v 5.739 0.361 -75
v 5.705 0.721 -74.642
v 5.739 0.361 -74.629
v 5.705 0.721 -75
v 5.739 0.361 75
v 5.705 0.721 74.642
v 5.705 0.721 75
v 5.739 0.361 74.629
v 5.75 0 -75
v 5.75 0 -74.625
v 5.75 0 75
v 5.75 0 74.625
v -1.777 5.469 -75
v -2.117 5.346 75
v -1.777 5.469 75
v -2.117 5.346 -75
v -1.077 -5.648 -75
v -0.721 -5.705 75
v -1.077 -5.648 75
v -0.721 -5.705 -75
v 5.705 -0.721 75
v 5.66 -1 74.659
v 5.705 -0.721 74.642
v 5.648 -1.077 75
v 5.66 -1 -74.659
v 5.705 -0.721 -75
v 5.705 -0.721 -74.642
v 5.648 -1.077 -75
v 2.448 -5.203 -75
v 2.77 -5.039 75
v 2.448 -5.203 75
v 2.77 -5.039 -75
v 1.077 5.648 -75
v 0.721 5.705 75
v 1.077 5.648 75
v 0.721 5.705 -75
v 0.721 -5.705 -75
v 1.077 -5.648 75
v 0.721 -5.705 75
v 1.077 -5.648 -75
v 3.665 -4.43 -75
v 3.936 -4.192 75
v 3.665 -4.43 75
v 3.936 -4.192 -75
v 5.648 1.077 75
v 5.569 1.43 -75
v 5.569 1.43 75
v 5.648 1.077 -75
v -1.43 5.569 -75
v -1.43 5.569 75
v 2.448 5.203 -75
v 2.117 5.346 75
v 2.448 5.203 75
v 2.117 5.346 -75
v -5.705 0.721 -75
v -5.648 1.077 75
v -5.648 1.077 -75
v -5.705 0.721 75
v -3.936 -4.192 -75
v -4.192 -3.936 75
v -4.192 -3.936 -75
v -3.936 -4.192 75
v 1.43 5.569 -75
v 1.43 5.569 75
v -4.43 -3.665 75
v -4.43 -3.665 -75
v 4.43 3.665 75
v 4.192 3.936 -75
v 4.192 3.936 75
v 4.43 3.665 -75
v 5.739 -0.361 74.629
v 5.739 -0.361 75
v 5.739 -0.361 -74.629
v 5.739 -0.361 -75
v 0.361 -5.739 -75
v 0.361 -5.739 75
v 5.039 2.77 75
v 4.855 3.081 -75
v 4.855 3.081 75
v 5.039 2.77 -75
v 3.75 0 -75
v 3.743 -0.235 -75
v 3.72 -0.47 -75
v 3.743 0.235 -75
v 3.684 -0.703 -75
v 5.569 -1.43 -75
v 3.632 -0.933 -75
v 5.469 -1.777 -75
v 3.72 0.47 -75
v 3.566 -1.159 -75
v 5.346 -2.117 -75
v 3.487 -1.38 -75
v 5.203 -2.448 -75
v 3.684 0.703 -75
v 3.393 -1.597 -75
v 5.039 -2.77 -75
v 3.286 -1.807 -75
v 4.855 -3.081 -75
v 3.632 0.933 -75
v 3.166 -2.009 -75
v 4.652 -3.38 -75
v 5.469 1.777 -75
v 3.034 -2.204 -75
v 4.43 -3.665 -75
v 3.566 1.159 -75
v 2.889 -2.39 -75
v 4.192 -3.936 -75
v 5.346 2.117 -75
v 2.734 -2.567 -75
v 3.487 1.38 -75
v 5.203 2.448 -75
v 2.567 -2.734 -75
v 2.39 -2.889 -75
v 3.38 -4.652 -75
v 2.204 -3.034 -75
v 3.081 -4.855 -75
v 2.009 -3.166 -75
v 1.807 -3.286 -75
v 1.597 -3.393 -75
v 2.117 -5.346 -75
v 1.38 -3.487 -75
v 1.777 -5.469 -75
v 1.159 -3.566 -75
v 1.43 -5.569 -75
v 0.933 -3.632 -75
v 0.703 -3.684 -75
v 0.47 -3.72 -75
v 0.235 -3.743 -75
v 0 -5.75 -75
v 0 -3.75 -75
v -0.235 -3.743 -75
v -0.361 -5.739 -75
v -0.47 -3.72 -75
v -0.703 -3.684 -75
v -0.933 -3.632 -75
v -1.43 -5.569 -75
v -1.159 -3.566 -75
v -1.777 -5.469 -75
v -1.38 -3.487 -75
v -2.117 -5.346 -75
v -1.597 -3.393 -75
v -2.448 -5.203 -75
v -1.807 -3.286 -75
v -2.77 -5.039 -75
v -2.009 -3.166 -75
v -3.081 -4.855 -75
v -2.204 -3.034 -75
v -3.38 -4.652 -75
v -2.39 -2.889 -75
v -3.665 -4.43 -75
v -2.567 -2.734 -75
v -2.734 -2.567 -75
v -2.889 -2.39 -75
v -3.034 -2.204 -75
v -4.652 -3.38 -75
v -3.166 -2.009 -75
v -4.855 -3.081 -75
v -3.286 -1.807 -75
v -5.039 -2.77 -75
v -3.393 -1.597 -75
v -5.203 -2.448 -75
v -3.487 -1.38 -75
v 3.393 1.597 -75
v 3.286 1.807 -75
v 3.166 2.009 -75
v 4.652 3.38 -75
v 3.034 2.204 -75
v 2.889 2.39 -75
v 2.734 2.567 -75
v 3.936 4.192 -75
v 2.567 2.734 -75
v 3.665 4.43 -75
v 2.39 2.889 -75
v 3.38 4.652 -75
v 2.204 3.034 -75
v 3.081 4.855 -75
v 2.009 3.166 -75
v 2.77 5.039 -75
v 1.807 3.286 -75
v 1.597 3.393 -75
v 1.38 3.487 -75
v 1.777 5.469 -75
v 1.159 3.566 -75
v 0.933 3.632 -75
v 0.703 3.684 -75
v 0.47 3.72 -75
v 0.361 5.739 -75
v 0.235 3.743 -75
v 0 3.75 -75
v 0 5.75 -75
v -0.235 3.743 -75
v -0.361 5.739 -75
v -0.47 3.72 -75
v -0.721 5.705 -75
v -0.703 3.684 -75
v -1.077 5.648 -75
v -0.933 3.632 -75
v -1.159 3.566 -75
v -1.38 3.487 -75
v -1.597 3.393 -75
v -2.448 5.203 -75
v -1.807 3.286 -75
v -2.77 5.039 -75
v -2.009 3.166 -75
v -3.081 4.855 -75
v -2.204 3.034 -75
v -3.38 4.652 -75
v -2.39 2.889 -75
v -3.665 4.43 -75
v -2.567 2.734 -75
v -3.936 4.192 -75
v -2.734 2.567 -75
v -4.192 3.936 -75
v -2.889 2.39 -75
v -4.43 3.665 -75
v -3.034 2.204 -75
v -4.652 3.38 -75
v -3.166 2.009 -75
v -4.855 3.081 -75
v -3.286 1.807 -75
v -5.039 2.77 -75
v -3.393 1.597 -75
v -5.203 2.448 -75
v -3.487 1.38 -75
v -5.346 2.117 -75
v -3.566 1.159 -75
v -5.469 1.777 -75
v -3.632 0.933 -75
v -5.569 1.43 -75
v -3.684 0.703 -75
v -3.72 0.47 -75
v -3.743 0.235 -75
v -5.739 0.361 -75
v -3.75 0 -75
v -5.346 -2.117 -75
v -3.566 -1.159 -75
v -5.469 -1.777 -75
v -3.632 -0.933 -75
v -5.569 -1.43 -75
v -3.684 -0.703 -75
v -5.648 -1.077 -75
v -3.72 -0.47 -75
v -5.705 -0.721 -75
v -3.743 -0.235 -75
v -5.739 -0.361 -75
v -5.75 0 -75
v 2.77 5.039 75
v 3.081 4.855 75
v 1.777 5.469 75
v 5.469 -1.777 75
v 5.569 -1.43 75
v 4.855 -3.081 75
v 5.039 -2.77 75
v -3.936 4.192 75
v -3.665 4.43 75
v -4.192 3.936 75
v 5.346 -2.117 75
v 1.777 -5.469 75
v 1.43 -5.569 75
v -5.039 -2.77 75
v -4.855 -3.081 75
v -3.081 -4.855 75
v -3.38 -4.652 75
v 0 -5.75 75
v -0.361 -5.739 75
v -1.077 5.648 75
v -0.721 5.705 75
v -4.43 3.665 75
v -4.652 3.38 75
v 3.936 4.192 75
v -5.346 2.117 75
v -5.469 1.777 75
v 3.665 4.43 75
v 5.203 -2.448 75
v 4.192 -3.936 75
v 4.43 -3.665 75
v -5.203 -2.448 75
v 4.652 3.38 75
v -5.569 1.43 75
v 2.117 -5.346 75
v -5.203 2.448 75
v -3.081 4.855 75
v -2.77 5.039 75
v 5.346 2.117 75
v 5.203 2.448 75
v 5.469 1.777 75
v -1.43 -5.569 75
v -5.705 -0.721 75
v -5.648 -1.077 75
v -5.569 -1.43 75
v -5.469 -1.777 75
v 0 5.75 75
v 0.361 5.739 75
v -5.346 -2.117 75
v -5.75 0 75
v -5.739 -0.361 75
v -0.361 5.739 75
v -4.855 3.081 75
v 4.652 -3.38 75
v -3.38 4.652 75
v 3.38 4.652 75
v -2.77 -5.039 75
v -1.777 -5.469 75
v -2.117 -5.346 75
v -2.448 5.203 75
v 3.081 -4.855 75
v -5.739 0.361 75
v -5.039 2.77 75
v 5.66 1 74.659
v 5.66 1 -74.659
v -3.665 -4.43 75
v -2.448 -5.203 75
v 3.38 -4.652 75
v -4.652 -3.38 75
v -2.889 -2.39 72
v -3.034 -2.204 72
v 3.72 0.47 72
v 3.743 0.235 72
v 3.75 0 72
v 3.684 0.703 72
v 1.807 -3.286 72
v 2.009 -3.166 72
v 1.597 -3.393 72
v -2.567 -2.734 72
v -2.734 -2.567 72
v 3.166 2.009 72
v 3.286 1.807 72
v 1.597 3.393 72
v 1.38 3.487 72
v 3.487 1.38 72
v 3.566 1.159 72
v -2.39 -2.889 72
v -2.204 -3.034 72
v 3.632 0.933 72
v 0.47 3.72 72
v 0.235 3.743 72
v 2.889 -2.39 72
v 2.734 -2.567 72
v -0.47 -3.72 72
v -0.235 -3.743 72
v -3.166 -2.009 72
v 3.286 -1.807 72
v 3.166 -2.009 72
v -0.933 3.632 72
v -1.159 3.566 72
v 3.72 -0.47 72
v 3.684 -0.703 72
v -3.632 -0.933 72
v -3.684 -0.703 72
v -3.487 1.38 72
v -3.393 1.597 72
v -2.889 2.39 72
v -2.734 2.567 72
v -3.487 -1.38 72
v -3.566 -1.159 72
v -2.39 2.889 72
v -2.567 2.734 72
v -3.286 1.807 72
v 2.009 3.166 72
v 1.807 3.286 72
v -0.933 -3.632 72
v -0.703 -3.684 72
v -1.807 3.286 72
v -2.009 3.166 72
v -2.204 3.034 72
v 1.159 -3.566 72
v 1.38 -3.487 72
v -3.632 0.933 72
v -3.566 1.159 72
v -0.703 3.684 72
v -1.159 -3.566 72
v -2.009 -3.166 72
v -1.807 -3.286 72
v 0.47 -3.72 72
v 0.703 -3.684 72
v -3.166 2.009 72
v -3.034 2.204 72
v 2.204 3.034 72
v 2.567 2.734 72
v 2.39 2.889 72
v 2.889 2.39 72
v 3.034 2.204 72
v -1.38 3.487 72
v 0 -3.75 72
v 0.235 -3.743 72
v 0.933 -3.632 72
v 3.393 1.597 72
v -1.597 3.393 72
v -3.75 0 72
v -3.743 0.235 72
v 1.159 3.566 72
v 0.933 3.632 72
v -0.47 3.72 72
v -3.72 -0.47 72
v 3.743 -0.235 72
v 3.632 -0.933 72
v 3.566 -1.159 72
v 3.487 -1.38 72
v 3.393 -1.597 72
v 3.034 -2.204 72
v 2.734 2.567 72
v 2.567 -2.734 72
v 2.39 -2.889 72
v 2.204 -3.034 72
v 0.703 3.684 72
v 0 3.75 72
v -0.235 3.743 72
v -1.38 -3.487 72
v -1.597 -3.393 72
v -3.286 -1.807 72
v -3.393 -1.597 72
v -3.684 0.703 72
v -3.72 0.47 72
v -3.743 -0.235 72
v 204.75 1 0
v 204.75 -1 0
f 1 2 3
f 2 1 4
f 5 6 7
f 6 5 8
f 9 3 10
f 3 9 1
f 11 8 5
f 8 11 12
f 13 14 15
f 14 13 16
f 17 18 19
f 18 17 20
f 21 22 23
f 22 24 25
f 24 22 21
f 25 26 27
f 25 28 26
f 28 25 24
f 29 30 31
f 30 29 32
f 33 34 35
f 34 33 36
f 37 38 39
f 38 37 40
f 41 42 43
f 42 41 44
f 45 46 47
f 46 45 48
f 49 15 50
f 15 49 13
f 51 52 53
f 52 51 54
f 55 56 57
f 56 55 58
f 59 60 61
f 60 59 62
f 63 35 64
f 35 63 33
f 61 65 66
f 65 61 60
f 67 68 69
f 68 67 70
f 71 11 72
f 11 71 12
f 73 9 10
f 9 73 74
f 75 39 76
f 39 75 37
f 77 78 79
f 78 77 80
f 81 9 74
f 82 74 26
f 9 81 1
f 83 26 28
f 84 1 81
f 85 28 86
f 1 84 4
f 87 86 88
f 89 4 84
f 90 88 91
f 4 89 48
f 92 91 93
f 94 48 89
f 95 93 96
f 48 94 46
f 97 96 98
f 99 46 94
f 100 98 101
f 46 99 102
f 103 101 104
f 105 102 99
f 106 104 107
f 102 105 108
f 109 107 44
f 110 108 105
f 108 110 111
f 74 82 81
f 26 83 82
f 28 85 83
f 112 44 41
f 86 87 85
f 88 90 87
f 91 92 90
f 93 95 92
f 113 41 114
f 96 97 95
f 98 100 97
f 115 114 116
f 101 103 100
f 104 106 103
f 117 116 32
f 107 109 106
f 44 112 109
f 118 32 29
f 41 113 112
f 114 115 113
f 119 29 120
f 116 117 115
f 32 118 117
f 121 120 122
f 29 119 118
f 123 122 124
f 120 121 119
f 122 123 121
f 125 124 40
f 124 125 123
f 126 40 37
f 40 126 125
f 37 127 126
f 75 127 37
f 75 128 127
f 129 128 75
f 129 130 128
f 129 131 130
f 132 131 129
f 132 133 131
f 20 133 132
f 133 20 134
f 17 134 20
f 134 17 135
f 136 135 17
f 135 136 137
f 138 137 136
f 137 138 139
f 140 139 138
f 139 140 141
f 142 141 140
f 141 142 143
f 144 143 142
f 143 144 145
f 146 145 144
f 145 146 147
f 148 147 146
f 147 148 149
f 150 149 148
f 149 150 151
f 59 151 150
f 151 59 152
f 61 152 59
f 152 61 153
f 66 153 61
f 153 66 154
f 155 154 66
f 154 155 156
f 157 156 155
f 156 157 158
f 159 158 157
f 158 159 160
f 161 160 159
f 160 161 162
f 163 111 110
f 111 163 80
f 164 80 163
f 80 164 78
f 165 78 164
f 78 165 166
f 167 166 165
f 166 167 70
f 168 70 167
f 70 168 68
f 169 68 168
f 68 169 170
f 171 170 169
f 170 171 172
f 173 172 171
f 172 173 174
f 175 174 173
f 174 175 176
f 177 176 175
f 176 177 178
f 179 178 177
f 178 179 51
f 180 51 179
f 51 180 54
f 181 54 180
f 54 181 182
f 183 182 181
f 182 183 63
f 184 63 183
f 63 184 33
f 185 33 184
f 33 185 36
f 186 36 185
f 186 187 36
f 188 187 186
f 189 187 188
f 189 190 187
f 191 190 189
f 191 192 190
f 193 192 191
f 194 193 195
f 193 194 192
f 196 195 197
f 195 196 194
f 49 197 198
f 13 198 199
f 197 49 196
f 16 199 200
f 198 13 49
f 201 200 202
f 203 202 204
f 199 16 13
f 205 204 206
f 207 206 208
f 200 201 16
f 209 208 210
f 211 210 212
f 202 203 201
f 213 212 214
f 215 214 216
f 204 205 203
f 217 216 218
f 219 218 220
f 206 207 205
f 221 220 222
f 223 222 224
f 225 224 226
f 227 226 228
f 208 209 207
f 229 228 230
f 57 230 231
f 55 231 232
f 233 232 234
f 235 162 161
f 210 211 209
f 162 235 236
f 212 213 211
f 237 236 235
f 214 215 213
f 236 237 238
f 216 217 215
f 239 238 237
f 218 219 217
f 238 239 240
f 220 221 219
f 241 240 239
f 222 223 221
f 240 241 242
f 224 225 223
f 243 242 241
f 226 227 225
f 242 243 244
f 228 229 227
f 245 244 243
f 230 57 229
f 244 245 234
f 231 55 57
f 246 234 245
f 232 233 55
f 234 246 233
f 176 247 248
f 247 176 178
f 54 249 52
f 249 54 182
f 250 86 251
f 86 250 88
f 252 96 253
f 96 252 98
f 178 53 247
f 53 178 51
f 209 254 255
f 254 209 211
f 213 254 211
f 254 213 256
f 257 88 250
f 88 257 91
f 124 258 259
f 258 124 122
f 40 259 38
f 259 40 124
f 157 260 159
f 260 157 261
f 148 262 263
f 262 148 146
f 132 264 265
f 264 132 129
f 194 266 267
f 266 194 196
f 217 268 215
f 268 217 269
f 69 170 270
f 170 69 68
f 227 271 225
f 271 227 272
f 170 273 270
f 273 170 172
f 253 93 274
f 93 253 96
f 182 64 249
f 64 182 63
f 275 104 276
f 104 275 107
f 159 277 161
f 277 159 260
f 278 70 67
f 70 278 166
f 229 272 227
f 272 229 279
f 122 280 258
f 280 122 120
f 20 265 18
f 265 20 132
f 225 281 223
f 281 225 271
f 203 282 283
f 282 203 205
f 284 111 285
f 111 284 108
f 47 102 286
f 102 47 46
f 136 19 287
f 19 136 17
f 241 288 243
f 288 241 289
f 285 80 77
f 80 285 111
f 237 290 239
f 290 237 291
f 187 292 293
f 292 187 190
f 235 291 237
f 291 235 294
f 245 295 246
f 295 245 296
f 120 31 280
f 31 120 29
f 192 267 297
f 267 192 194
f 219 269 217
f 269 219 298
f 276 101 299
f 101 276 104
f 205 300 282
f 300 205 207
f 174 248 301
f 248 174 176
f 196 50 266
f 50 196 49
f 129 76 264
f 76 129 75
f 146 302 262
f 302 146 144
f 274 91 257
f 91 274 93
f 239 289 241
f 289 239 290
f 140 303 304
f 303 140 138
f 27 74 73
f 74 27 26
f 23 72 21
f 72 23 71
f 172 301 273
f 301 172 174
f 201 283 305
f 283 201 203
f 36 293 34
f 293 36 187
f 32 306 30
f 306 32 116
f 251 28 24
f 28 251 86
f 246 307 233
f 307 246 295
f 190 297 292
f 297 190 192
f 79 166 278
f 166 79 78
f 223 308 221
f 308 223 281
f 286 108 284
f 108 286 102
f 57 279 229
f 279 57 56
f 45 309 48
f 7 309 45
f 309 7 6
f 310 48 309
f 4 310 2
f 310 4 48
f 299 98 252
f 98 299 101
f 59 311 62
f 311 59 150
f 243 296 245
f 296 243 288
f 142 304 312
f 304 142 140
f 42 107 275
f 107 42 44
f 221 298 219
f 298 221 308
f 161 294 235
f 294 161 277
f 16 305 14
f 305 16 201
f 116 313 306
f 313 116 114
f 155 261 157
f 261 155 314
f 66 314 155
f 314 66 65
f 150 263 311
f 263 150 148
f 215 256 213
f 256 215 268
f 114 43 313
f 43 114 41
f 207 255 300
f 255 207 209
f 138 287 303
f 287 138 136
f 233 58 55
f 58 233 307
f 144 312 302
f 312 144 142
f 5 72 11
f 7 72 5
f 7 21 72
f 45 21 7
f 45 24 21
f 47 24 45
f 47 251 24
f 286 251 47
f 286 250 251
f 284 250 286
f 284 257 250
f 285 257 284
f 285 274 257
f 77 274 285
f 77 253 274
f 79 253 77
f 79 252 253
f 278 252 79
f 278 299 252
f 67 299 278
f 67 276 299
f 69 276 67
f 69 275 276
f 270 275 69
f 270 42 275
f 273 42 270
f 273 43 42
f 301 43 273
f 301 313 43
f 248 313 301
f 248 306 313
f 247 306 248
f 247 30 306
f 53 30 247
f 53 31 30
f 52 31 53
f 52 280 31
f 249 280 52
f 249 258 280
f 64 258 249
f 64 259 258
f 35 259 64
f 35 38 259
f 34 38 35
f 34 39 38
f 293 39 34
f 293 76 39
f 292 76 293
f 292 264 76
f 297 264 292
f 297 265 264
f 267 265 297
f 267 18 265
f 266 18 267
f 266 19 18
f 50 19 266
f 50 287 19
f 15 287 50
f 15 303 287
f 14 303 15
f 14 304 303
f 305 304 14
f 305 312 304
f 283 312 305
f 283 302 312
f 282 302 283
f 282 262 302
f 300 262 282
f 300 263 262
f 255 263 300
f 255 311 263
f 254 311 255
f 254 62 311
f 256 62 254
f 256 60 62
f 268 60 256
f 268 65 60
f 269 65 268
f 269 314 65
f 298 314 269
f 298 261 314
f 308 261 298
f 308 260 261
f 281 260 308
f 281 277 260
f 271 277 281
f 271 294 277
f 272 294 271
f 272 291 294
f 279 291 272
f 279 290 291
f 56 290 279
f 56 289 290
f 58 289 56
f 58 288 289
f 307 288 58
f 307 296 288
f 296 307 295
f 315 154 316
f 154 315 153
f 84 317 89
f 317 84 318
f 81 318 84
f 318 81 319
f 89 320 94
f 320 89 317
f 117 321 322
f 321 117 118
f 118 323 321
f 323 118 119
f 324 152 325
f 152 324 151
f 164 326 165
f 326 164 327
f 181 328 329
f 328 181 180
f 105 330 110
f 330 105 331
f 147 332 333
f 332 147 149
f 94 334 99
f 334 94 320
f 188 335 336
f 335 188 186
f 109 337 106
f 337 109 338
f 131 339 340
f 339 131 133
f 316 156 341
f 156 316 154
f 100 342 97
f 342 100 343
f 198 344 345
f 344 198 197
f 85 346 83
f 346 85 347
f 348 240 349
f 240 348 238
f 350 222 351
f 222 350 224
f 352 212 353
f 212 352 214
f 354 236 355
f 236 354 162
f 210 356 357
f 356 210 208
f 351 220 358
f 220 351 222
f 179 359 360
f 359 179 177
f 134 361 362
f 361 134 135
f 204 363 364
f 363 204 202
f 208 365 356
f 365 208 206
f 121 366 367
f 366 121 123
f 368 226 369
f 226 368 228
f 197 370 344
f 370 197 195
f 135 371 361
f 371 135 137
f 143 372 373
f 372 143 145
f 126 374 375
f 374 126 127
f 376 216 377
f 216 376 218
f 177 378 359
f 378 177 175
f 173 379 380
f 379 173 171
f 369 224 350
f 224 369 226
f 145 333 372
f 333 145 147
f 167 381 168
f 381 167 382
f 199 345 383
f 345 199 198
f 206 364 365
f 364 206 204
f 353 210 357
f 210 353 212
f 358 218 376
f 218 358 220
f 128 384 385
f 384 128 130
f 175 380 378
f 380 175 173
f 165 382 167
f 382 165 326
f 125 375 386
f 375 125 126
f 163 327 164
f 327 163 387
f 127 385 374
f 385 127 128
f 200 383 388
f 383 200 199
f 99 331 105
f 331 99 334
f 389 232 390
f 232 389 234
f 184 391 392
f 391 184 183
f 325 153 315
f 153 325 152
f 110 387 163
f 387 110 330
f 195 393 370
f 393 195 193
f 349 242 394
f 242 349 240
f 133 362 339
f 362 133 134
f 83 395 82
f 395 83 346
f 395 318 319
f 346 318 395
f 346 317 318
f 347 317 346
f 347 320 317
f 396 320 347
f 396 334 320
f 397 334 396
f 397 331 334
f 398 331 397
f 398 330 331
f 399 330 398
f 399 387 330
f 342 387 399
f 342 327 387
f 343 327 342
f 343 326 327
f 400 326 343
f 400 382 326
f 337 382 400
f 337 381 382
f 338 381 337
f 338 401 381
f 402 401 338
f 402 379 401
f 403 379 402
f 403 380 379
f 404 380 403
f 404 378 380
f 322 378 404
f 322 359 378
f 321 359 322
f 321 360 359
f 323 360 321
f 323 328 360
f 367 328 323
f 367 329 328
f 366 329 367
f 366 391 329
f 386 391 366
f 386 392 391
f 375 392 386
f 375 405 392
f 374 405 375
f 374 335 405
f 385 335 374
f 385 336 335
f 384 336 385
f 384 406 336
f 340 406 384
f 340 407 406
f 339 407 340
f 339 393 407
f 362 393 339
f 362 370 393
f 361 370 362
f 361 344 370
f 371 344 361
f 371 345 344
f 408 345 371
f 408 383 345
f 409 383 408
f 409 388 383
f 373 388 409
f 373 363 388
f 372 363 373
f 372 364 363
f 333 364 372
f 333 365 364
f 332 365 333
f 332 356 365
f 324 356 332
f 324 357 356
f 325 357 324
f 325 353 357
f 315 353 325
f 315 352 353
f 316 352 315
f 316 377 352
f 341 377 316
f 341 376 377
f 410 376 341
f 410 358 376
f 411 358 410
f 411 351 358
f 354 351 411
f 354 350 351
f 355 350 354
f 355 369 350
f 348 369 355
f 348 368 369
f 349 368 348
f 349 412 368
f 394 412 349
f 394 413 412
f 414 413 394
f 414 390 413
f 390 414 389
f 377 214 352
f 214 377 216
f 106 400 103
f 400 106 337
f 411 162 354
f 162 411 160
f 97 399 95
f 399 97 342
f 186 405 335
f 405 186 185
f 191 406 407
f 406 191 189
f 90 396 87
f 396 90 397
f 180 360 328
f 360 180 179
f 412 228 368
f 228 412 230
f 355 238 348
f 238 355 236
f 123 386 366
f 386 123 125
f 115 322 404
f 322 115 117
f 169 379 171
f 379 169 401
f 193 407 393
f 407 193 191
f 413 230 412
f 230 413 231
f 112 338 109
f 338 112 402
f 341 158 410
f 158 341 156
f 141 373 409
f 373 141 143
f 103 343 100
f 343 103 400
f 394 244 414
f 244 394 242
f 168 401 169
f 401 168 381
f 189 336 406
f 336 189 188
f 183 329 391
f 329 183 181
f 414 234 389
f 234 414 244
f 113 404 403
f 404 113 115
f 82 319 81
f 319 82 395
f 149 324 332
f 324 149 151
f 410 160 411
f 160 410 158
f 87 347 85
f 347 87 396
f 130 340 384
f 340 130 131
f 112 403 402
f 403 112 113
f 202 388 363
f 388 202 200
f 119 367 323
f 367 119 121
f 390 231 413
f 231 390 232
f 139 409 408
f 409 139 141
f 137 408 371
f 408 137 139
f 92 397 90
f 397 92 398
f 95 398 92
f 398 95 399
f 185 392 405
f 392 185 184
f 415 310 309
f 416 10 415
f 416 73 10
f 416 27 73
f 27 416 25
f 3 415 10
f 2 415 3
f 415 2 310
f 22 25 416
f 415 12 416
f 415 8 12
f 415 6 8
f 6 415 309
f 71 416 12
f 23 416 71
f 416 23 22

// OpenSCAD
// Customizable Flag Banner
// Copyright: Olle Johansson 2018
// License: CC BY-SA

//CUSTOMIZER VARIABLES

// Height in mm of flag
height_of_flag = 150; // [100:5:200]

// Length in mm of flag
length_of_flag = 200; // [100:5:250]

// Diameter in mm of pole hole
diameter_of_hole = 7.5; // [4:0.5:16]

// Thickness in mm of flag
thickness = 2; // [2:0.1:6]

//CUSTOMIZER VARIABLES END

/* [Hidden] */

$fn = 100;

module pole() {
    difference() {
        cylinder(h = height_of_flag, d = diameter_of_hole + thickness * 2, center = true);
        translate([0, 0, -thickness])
        cylinder(h = height_of_flag - thickness, d = diameter_of_hole, center = true);
    }
}

module banner() {
    translate([diameter_of_hole / 2 + thickness / 2, 0, - height_of_flag / 2])
    rotate([90, 0, 0])
    linear_extrude(height = thickness, center = true)
    polygon(points = [
        [0, 0],
        [length_of_flag, height_of_flag / 2],
        [0, height_of_flag]
    ]);
}

module flag() {
    pole();
    banner();
}

flag();
